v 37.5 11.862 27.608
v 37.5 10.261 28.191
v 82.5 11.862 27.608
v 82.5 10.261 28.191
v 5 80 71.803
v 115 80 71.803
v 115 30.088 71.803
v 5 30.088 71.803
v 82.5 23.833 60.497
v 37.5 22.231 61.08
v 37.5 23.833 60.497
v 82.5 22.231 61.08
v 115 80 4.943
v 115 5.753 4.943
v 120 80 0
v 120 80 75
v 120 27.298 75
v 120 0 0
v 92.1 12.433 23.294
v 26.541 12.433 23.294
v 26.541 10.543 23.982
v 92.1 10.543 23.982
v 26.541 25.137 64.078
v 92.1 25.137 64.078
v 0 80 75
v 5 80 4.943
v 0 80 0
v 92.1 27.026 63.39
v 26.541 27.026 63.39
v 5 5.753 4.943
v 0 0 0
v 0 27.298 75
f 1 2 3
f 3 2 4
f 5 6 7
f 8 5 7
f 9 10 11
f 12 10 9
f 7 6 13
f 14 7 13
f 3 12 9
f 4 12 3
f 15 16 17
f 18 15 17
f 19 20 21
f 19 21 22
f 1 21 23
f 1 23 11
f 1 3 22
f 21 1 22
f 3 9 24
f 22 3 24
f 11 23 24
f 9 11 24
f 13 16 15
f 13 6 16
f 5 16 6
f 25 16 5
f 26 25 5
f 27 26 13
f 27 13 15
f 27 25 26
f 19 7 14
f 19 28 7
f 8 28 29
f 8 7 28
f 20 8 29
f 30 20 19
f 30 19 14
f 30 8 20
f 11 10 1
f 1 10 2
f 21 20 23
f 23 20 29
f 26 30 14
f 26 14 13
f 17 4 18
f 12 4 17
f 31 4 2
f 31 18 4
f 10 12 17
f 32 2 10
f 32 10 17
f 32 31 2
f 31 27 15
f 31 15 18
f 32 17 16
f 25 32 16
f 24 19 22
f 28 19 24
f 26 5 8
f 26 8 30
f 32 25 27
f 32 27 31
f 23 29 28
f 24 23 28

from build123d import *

# Parameters (mm, degrees)
SKETCH003_AS_DRAWN_W                      = 65.558531
SKETCH003_AS_DRAWN_H                      = 42.669216
EXTRUDE002_DEPTH                          = 10
EXTRUDE002_ONTO_SKETCH003_PLACEMENT_ANGLE = 70
EXTRUDE_DEPTH                             = 110
SKETCH001_AS_DRAWN_W                      = 35
SKETCH001_AS_DRAWN_H                      = 45
EXTRUDE001_DEPTH                          = 10
EXTRUDE001_DEPTH_BACK                     = 60
EXTRUDE001_ONTO_SKETCH001_PITCH_ANGLE     = 70
EXTRUDE001_ONTO_SKETCH001_PLACEMENT_ANGLE = -90
PAD_DEPTH                                 = 120


with BuildPart() as extrude002:
    # Sketch003 as drawn → Extrude002 (new)
    with BuildSketch(Plane.XY):
        with Locations((59.320267, 47.473028)):
            Rectangle(SKETCH003_AS_DRAWN_W, SKETCH003_AS_DRAWN_H)
    extrude(amount=EXTRUDE002_DEPTH)


with BuildPart() as extrude002_1:
    # Extrude002 onto Sketch003 placement: moved
    add(extrude002.part.rotate(Axis((0, 0, 0), (1, 0, 0)), EXTRUDE002_ONTO_SKETCH003_PLACEMENT_ANGLE))


with BuildPart() as extrude002_2:
    # Extrude002 placement: moved
    add(extrude002_1.part.moved(Location((0, 11, -4))))


with BuildPart() as extrude_body:
    # Sketch002 (on DatumPlane) → Extrude (new body)
    with BuildSketch(Plane(origin=(120, 0, 120), x_dir=(0, 0, -1), z_dir=(1, 0, 0))):
        Polygon((48.197427, 92.291939), (48.197427, 30.088142), (115.056506, 5.753427), (115.056506, 92.291939), align=None)
    extrude(amount=EXTRUDE_DEPTH)


with BuildPart() as extrude_body_1:
    # Extrude placement: moved
    add(extrude_body.part.moved(Location((-115, 0, 0))))


with BuildPart() as extrude001:
    # Sketch001 as drawn → Extrude001 (new, two sides)
    with BuildSketch(Plane.XY) as extrude001_sk:
        with Locations((-47.5, 60)):
            Rectangle(SKETCH001_AS_DRAWN_W, SKETCH001_AS_DRAWN_H)
    extrude(amount=EXTRUDE001_DEPTH)
    extrude(extrude001_sk.sketch, amount=-EXTRUDE001_DEPTH_BACK)


with BuildPart() as extrude001_1:
    # Extrude001 onto Sketch001 pitch: moved
    add(extrude001.part.rotate(Axis((0, 0, 0), (0, 1, 0)), EXTRUDE001_ONTO_SKETCH001_PITCH_ANGLE))


with BuildPart() as extrude001_2:
    # Extrude001 onto Sketch001 placement: moved
    add(extrude001_1.part.rotate(Axis((0, 0, 0), (0, 0, 1)), EXTRUDE001_ONTO_SKETCH001_PLACEMENT_ANGLE))


with BuildPart() as cut002:
    # Sketch → Pad (new body)
    with BuildSketch(Plane.YZ):
        Polygon((0, 0), (27.297768, 75), (80, 75), (80, 0), align=None)
    extrude(amount=PAD_DEPTH)

    # Cut: cut Extrude001
    add(extrude001_2.part, mode=Mode.SUBTRACT)

    # Cut001: cut Extrude body
    add(extrude_body_1.part, mode=Mode.SUBTRACT)

    # Cut002: cut Extrude002
    add(extrude002_2.part, mode=Mode.SUBTRACT)


solid = cut002.part
